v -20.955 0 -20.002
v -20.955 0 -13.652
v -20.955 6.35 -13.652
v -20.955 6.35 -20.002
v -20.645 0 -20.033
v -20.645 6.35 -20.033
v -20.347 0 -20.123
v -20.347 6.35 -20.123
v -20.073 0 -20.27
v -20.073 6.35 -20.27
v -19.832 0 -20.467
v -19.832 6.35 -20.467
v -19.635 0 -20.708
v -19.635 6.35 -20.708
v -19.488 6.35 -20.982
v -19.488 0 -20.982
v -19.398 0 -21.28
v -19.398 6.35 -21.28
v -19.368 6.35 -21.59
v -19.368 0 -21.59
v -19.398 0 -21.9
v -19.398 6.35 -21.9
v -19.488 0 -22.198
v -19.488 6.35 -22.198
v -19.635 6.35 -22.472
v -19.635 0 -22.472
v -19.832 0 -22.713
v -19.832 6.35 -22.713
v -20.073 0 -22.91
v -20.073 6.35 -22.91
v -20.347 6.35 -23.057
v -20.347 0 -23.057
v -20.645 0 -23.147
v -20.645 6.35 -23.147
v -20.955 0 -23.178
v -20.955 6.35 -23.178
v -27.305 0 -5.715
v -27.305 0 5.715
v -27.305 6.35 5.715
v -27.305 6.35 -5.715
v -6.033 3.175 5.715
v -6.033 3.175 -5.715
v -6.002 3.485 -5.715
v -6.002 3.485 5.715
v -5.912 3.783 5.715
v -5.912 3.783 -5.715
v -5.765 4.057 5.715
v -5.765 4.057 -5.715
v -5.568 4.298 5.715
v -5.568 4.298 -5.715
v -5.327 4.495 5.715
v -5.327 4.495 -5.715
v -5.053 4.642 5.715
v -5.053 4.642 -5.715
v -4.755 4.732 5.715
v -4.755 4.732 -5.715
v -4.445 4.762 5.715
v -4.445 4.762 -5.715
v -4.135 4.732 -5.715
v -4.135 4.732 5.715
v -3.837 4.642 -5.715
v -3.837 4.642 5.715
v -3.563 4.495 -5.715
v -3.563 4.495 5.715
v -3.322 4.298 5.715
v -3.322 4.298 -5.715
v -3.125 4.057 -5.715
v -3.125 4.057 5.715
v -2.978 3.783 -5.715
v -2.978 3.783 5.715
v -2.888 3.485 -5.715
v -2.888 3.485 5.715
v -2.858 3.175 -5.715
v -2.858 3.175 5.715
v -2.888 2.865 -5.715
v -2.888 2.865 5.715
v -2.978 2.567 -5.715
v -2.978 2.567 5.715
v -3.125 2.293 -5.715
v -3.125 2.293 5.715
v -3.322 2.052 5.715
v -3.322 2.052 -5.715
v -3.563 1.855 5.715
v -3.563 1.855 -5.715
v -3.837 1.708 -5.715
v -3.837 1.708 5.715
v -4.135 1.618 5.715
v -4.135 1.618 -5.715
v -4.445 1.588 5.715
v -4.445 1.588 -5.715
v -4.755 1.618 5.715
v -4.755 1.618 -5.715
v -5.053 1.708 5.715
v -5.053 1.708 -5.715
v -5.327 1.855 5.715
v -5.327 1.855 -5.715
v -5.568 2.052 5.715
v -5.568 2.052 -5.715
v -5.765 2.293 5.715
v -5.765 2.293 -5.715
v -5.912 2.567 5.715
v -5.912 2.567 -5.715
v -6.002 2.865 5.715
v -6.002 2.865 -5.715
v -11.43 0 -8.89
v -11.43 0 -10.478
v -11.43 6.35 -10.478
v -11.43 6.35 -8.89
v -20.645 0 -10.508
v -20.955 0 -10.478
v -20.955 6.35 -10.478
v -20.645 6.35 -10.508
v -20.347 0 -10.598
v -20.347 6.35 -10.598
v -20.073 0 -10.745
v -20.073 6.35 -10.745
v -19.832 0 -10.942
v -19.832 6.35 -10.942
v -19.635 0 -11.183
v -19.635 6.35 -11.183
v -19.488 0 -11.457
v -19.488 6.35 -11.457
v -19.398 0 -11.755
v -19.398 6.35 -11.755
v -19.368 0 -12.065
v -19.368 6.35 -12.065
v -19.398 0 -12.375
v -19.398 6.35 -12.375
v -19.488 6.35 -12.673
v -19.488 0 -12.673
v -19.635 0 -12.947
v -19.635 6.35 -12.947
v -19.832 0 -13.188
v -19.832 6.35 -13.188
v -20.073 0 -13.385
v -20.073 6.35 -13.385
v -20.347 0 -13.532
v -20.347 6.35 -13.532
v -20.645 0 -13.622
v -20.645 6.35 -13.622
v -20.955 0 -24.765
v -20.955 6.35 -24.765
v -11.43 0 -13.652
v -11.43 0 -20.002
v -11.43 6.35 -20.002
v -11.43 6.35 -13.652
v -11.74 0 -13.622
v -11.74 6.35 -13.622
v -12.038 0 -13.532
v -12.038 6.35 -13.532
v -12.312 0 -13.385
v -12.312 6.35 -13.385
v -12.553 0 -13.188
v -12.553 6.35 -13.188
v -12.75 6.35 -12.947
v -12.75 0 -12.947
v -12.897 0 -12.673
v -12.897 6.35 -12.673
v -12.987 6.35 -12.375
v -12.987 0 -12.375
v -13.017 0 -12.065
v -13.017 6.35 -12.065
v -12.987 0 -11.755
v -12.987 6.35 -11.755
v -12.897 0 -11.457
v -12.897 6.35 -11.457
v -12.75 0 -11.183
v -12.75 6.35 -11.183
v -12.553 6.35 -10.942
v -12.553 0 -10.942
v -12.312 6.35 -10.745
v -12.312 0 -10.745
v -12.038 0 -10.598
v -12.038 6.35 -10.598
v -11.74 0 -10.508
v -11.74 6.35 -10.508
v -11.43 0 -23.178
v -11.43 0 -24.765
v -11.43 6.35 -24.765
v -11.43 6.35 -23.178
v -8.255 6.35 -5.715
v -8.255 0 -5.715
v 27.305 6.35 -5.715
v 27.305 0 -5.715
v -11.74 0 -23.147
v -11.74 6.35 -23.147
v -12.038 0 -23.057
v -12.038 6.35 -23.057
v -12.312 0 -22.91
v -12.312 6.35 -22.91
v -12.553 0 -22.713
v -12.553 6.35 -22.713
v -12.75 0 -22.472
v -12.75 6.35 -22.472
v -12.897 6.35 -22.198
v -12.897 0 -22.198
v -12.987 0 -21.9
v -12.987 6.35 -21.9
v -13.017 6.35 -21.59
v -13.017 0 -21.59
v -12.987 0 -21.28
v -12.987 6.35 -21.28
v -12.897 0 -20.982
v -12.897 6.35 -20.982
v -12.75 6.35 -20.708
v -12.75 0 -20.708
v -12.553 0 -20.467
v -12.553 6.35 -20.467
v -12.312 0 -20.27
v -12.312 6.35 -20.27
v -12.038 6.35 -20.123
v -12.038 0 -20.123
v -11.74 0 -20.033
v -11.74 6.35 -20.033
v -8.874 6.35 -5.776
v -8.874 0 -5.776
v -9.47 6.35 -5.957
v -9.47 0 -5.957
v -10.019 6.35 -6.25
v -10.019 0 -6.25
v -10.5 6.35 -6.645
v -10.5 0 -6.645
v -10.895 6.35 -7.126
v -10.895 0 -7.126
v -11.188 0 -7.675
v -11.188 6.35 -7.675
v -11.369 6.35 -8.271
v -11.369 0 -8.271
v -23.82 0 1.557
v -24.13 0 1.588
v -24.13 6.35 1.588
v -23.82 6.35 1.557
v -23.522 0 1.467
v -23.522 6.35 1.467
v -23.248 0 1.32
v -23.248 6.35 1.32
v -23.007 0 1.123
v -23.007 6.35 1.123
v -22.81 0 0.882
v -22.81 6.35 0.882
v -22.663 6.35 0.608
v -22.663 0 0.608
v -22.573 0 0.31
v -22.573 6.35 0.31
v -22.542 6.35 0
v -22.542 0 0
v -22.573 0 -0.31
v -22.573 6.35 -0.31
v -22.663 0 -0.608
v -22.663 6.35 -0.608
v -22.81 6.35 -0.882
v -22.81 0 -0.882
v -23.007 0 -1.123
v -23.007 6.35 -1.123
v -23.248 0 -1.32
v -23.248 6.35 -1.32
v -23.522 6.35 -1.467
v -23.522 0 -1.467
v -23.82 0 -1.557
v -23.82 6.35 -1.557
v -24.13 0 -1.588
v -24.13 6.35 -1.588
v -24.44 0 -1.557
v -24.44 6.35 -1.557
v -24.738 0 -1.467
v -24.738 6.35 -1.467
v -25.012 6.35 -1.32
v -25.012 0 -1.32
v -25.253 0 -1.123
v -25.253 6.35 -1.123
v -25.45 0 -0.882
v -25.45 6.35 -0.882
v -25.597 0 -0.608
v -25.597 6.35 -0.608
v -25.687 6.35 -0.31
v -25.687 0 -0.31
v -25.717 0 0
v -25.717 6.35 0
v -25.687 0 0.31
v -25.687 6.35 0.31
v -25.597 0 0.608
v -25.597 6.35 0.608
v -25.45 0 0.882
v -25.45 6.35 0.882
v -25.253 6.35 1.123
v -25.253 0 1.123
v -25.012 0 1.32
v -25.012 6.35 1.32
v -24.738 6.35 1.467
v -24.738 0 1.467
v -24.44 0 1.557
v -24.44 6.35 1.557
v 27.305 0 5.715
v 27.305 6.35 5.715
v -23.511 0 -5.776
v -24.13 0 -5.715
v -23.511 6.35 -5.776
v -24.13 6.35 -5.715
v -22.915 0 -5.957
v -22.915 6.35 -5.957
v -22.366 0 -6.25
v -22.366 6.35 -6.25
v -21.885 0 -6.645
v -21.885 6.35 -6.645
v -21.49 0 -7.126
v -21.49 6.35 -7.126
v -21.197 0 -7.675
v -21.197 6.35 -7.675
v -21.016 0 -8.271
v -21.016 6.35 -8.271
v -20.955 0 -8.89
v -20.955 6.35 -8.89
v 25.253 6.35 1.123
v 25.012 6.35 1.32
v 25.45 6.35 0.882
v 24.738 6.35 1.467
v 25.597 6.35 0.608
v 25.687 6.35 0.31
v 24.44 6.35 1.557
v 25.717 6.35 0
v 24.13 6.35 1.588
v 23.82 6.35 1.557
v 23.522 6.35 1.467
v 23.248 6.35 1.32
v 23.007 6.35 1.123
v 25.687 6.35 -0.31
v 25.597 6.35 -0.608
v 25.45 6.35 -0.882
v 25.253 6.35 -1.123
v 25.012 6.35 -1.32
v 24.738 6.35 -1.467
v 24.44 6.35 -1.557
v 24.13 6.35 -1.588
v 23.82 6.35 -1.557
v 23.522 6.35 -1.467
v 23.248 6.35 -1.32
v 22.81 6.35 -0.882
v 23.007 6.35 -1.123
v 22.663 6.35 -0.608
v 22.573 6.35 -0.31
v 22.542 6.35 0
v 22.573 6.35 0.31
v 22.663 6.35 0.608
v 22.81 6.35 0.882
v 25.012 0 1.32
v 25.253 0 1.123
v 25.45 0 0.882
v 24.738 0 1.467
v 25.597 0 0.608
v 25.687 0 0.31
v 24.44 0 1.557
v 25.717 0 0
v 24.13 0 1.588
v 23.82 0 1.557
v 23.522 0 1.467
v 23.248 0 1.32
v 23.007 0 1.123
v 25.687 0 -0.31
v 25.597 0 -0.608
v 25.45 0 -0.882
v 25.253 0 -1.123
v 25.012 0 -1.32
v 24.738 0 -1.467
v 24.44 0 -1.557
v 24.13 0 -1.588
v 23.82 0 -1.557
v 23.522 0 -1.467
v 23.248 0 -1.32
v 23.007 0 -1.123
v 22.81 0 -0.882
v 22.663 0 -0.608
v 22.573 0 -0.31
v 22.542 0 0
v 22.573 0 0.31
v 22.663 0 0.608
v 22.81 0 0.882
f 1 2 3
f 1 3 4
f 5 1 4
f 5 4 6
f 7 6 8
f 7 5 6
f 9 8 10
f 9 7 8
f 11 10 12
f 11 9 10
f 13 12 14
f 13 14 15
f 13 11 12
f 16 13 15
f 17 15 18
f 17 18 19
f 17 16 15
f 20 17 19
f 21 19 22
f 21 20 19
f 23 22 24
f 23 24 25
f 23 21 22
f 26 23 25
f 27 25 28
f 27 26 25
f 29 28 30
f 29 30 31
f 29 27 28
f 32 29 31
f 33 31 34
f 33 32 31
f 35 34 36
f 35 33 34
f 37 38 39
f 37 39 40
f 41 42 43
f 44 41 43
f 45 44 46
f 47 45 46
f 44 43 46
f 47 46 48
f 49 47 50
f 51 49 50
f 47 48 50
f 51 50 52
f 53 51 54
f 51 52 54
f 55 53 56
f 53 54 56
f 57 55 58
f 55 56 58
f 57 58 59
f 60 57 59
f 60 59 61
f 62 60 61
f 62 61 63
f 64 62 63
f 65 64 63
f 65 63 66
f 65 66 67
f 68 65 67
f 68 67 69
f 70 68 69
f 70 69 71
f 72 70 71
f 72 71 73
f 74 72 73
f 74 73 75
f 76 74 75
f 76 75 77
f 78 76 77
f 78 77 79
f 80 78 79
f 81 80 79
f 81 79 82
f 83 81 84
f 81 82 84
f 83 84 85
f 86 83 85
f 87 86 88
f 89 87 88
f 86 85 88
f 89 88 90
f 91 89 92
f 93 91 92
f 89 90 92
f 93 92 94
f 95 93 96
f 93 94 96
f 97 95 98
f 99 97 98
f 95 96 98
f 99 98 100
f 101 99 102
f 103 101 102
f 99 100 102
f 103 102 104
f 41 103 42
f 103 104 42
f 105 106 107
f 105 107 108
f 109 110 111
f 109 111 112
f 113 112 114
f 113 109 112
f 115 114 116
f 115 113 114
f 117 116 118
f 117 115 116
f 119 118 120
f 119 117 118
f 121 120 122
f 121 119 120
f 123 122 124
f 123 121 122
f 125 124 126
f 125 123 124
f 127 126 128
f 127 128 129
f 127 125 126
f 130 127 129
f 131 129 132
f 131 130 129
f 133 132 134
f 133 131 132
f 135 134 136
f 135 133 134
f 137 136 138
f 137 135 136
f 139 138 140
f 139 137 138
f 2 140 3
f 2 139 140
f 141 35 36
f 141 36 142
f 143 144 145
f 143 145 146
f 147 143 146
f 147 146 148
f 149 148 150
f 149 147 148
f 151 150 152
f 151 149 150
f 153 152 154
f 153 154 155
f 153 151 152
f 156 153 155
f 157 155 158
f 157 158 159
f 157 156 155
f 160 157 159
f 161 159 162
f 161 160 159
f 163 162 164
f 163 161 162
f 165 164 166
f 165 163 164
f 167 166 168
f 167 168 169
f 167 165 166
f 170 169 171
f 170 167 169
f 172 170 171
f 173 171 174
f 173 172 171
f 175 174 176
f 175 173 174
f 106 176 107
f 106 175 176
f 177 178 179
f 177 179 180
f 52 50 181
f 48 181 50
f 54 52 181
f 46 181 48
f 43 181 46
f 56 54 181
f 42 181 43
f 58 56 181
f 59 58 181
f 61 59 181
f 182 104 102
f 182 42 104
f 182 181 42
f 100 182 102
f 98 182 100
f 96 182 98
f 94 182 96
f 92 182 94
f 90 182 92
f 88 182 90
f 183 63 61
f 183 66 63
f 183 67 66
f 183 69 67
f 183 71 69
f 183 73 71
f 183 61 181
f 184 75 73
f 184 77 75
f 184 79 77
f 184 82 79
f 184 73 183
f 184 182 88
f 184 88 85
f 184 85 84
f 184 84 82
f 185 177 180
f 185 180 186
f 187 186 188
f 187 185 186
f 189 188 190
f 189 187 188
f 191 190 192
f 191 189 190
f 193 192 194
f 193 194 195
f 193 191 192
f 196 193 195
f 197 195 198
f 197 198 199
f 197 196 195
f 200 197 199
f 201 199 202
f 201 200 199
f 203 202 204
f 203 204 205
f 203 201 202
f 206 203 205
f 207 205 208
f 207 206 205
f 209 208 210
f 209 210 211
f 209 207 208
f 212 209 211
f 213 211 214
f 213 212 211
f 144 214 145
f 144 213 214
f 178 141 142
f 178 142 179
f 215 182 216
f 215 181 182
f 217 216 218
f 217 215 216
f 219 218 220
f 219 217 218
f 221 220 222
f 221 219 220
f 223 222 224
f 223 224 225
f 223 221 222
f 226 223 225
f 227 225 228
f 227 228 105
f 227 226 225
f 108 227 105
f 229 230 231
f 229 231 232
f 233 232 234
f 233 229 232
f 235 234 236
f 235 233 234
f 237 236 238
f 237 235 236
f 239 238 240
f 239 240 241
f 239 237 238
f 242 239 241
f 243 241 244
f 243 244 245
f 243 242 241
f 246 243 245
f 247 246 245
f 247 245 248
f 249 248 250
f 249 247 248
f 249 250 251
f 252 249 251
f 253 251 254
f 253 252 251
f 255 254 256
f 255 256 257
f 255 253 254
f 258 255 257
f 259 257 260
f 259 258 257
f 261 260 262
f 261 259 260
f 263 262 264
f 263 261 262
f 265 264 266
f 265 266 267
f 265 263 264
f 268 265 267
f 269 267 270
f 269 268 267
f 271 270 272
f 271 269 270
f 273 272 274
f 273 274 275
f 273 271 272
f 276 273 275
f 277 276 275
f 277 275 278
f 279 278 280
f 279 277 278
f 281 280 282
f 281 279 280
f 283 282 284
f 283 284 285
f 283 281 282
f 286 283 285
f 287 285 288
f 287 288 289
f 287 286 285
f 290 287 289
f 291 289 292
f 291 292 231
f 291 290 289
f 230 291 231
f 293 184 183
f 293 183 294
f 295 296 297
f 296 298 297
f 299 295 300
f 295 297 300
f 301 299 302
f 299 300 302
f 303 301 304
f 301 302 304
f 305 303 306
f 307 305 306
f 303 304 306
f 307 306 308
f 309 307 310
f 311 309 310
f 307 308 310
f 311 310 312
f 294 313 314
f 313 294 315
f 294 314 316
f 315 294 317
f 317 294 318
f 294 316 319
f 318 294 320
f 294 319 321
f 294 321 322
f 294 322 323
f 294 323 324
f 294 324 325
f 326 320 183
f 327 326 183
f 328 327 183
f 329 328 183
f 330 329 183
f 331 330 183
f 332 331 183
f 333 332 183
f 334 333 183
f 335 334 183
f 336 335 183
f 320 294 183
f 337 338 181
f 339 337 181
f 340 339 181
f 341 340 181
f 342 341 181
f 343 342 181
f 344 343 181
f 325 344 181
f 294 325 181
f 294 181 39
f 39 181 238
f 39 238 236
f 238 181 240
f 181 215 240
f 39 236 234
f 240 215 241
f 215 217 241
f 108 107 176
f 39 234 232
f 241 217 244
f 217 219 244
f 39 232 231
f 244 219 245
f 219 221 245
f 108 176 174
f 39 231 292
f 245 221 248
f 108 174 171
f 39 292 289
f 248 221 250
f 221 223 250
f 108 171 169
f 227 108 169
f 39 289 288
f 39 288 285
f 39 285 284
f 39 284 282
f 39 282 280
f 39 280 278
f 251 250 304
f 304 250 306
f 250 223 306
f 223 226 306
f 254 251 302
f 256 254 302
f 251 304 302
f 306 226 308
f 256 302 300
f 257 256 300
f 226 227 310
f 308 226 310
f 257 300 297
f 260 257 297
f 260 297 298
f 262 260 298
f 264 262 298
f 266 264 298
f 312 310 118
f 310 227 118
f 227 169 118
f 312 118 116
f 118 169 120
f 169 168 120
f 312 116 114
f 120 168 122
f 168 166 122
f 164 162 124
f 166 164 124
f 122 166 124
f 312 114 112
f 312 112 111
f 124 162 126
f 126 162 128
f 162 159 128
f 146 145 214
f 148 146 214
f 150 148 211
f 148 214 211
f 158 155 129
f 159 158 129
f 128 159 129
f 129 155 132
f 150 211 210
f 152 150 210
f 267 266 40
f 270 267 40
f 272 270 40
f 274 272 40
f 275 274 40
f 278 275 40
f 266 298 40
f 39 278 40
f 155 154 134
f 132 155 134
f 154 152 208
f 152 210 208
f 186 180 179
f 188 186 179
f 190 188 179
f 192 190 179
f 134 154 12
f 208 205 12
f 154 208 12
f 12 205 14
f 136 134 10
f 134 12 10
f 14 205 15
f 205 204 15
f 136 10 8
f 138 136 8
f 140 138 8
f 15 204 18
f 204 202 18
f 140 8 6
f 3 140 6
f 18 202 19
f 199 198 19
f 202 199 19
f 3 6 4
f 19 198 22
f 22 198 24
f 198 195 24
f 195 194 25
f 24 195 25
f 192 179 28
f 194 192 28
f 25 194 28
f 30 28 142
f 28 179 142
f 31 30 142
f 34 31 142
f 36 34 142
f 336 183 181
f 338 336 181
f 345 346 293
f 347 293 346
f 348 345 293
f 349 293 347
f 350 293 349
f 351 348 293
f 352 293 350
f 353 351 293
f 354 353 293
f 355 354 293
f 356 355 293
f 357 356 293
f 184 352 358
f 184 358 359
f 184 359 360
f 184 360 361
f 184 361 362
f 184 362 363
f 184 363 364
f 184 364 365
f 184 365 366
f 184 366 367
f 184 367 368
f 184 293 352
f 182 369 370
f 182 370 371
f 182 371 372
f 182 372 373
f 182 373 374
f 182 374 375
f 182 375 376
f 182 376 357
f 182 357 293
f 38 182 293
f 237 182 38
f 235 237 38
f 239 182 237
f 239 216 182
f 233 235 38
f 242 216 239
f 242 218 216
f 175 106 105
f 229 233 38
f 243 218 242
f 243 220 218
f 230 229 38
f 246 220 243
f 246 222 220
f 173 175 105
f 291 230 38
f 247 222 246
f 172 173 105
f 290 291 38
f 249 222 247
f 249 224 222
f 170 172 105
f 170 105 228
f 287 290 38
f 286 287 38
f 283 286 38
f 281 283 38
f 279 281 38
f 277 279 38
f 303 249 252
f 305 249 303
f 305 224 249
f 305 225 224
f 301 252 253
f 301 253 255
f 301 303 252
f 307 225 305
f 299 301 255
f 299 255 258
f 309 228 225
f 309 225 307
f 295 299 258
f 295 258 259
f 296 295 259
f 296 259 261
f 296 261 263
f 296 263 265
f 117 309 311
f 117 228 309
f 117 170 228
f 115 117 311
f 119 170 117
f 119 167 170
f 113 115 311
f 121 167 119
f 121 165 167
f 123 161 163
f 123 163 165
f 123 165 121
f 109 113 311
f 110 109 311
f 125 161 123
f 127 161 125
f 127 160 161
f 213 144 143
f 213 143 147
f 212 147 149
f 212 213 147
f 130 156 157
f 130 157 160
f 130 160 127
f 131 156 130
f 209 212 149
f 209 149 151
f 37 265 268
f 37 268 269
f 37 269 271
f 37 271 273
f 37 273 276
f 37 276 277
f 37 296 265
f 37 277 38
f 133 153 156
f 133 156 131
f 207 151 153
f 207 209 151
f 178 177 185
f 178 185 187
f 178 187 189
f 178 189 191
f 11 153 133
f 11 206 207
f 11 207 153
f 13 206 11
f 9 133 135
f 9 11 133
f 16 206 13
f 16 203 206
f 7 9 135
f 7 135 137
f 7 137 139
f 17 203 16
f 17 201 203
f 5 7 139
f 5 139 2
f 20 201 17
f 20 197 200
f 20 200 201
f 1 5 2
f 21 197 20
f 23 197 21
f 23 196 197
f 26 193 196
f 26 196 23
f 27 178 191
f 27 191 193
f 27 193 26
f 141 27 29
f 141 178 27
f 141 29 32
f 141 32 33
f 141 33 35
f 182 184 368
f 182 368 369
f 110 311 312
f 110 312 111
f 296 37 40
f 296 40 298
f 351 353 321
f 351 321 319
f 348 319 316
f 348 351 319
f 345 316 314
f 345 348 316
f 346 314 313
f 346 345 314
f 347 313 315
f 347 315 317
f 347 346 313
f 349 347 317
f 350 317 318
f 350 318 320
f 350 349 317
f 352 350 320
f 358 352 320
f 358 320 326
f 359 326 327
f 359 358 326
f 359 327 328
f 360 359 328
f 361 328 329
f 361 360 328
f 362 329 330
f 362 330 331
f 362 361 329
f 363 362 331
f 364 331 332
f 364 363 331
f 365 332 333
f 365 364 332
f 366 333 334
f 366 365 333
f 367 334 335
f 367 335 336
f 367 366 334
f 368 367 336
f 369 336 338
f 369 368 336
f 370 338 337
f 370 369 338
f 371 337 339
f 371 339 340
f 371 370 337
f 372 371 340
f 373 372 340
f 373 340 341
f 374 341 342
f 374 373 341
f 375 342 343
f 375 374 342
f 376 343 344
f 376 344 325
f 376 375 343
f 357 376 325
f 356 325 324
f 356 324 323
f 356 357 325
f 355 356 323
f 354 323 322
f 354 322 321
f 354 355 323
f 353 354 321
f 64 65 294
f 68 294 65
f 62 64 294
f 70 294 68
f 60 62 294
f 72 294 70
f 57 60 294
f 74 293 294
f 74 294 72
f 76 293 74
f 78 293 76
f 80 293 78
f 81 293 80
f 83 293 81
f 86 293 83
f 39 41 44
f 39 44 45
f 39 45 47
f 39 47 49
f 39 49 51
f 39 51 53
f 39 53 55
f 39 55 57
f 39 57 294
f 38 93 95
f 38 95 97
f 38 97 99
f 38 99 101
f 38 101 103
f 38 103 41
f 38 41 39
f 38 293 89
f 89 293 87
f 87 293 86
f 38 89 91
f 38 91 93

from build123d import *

# Parameters (mm, degrees)
SKETCH1_R           = 1.5875
BOSS_EXTRUDE1_DEPTH = 6.35
FILLET1_R           = 3.175
SKETCH2_R           = 1.5875
TIES_HOLE_DEPTH     = 34.893775609


with BuildPart() as part:
    # Sketch1 → Boss-Extrude1 (new body)
    with BuildSketch(Plane(origin=(0, 0, 0), x_dir=(1, 0, 0), z_dir=(0, 1, 0))):
        with BuildLine():
            Line((-27.305, 5.715), (-20.955, 5.715))
            Line((-20.955, 5.715), (-20.955, 10.4775))
            ThreePointArc((-20.955, 10.4775), (-19.3675, 12.065), (-20.955, 13.6525))
            Line((-20.955, 13.6525), (-20.955, 20.0025))
            ThreePointArc((-20.955, 20.0025), (-19.3675, 21.59), (-20.955, 23.1775))
            Line((-20.955, 23.1775), (-20.955, 24.765))
            Line((-20.955, 24.765), (-11.43, 24.765))
            Line((-11.43, 24.765), (-11.43, 23.1775))
            ThreePointArc((-11.43, 23.1775), (-13.0175, 21.59), (-11.43, 20.0025))
            Line((-11.43, 20.0025), (-11.43, 13.6525))
            ThreePointArc((-11.43, 13.6525), (-13.0175, 12.065), (-11.43, 10.4775))
            Line((-11.43, 10.4775), (-11.43, 5.715))
            Line((-11.43, 5.715), (27.305, 5.715))
            Line((27.305, 5.715), (27.305, -5.715))
            Line((27.305, -5.715), (-27.305, -5.715))
            Line((-27.305, -5.715), (-27.305, 5.715))
        make_face()
        with Locations(Location((-24.13, 0, 0), (0, 0, 270))):
            Circle(SKETCH1_R, mode=Mode.SUBTRACT)
        with Locations(Location((24.13, 0, 0), (0, 0, 270))):
            Circle(SKETCH1_R, mode=Mode.SUBTRACT)
    extrude(amount=BOSS_EXTRUDE1_DEPTH)

    # Fillet1
    fillet1_edges = [part.edges().sort_by_distance(p)[0] for p in [
        (-20.955, 3.175, -5.715),
        (-11.43, 3.175, -5.715),
    ]]
    fillet(fillet1_edges, radius=FILLET1_R)

    # Sketch2 → ties hole (cut, through all)
    with BuildSketch(Plane(origin=(0, 0, -5.715), x_dir=(-1, 0, 0), z_dir=(0, 0, -1))):
        with Locations((4.445, 3.175)):
            Circle(SKETCH2_R)
    extrude(amount=-TIES_HOLE_DEPTH, mode=Mode.SUBTRACT)


solid = part.part
